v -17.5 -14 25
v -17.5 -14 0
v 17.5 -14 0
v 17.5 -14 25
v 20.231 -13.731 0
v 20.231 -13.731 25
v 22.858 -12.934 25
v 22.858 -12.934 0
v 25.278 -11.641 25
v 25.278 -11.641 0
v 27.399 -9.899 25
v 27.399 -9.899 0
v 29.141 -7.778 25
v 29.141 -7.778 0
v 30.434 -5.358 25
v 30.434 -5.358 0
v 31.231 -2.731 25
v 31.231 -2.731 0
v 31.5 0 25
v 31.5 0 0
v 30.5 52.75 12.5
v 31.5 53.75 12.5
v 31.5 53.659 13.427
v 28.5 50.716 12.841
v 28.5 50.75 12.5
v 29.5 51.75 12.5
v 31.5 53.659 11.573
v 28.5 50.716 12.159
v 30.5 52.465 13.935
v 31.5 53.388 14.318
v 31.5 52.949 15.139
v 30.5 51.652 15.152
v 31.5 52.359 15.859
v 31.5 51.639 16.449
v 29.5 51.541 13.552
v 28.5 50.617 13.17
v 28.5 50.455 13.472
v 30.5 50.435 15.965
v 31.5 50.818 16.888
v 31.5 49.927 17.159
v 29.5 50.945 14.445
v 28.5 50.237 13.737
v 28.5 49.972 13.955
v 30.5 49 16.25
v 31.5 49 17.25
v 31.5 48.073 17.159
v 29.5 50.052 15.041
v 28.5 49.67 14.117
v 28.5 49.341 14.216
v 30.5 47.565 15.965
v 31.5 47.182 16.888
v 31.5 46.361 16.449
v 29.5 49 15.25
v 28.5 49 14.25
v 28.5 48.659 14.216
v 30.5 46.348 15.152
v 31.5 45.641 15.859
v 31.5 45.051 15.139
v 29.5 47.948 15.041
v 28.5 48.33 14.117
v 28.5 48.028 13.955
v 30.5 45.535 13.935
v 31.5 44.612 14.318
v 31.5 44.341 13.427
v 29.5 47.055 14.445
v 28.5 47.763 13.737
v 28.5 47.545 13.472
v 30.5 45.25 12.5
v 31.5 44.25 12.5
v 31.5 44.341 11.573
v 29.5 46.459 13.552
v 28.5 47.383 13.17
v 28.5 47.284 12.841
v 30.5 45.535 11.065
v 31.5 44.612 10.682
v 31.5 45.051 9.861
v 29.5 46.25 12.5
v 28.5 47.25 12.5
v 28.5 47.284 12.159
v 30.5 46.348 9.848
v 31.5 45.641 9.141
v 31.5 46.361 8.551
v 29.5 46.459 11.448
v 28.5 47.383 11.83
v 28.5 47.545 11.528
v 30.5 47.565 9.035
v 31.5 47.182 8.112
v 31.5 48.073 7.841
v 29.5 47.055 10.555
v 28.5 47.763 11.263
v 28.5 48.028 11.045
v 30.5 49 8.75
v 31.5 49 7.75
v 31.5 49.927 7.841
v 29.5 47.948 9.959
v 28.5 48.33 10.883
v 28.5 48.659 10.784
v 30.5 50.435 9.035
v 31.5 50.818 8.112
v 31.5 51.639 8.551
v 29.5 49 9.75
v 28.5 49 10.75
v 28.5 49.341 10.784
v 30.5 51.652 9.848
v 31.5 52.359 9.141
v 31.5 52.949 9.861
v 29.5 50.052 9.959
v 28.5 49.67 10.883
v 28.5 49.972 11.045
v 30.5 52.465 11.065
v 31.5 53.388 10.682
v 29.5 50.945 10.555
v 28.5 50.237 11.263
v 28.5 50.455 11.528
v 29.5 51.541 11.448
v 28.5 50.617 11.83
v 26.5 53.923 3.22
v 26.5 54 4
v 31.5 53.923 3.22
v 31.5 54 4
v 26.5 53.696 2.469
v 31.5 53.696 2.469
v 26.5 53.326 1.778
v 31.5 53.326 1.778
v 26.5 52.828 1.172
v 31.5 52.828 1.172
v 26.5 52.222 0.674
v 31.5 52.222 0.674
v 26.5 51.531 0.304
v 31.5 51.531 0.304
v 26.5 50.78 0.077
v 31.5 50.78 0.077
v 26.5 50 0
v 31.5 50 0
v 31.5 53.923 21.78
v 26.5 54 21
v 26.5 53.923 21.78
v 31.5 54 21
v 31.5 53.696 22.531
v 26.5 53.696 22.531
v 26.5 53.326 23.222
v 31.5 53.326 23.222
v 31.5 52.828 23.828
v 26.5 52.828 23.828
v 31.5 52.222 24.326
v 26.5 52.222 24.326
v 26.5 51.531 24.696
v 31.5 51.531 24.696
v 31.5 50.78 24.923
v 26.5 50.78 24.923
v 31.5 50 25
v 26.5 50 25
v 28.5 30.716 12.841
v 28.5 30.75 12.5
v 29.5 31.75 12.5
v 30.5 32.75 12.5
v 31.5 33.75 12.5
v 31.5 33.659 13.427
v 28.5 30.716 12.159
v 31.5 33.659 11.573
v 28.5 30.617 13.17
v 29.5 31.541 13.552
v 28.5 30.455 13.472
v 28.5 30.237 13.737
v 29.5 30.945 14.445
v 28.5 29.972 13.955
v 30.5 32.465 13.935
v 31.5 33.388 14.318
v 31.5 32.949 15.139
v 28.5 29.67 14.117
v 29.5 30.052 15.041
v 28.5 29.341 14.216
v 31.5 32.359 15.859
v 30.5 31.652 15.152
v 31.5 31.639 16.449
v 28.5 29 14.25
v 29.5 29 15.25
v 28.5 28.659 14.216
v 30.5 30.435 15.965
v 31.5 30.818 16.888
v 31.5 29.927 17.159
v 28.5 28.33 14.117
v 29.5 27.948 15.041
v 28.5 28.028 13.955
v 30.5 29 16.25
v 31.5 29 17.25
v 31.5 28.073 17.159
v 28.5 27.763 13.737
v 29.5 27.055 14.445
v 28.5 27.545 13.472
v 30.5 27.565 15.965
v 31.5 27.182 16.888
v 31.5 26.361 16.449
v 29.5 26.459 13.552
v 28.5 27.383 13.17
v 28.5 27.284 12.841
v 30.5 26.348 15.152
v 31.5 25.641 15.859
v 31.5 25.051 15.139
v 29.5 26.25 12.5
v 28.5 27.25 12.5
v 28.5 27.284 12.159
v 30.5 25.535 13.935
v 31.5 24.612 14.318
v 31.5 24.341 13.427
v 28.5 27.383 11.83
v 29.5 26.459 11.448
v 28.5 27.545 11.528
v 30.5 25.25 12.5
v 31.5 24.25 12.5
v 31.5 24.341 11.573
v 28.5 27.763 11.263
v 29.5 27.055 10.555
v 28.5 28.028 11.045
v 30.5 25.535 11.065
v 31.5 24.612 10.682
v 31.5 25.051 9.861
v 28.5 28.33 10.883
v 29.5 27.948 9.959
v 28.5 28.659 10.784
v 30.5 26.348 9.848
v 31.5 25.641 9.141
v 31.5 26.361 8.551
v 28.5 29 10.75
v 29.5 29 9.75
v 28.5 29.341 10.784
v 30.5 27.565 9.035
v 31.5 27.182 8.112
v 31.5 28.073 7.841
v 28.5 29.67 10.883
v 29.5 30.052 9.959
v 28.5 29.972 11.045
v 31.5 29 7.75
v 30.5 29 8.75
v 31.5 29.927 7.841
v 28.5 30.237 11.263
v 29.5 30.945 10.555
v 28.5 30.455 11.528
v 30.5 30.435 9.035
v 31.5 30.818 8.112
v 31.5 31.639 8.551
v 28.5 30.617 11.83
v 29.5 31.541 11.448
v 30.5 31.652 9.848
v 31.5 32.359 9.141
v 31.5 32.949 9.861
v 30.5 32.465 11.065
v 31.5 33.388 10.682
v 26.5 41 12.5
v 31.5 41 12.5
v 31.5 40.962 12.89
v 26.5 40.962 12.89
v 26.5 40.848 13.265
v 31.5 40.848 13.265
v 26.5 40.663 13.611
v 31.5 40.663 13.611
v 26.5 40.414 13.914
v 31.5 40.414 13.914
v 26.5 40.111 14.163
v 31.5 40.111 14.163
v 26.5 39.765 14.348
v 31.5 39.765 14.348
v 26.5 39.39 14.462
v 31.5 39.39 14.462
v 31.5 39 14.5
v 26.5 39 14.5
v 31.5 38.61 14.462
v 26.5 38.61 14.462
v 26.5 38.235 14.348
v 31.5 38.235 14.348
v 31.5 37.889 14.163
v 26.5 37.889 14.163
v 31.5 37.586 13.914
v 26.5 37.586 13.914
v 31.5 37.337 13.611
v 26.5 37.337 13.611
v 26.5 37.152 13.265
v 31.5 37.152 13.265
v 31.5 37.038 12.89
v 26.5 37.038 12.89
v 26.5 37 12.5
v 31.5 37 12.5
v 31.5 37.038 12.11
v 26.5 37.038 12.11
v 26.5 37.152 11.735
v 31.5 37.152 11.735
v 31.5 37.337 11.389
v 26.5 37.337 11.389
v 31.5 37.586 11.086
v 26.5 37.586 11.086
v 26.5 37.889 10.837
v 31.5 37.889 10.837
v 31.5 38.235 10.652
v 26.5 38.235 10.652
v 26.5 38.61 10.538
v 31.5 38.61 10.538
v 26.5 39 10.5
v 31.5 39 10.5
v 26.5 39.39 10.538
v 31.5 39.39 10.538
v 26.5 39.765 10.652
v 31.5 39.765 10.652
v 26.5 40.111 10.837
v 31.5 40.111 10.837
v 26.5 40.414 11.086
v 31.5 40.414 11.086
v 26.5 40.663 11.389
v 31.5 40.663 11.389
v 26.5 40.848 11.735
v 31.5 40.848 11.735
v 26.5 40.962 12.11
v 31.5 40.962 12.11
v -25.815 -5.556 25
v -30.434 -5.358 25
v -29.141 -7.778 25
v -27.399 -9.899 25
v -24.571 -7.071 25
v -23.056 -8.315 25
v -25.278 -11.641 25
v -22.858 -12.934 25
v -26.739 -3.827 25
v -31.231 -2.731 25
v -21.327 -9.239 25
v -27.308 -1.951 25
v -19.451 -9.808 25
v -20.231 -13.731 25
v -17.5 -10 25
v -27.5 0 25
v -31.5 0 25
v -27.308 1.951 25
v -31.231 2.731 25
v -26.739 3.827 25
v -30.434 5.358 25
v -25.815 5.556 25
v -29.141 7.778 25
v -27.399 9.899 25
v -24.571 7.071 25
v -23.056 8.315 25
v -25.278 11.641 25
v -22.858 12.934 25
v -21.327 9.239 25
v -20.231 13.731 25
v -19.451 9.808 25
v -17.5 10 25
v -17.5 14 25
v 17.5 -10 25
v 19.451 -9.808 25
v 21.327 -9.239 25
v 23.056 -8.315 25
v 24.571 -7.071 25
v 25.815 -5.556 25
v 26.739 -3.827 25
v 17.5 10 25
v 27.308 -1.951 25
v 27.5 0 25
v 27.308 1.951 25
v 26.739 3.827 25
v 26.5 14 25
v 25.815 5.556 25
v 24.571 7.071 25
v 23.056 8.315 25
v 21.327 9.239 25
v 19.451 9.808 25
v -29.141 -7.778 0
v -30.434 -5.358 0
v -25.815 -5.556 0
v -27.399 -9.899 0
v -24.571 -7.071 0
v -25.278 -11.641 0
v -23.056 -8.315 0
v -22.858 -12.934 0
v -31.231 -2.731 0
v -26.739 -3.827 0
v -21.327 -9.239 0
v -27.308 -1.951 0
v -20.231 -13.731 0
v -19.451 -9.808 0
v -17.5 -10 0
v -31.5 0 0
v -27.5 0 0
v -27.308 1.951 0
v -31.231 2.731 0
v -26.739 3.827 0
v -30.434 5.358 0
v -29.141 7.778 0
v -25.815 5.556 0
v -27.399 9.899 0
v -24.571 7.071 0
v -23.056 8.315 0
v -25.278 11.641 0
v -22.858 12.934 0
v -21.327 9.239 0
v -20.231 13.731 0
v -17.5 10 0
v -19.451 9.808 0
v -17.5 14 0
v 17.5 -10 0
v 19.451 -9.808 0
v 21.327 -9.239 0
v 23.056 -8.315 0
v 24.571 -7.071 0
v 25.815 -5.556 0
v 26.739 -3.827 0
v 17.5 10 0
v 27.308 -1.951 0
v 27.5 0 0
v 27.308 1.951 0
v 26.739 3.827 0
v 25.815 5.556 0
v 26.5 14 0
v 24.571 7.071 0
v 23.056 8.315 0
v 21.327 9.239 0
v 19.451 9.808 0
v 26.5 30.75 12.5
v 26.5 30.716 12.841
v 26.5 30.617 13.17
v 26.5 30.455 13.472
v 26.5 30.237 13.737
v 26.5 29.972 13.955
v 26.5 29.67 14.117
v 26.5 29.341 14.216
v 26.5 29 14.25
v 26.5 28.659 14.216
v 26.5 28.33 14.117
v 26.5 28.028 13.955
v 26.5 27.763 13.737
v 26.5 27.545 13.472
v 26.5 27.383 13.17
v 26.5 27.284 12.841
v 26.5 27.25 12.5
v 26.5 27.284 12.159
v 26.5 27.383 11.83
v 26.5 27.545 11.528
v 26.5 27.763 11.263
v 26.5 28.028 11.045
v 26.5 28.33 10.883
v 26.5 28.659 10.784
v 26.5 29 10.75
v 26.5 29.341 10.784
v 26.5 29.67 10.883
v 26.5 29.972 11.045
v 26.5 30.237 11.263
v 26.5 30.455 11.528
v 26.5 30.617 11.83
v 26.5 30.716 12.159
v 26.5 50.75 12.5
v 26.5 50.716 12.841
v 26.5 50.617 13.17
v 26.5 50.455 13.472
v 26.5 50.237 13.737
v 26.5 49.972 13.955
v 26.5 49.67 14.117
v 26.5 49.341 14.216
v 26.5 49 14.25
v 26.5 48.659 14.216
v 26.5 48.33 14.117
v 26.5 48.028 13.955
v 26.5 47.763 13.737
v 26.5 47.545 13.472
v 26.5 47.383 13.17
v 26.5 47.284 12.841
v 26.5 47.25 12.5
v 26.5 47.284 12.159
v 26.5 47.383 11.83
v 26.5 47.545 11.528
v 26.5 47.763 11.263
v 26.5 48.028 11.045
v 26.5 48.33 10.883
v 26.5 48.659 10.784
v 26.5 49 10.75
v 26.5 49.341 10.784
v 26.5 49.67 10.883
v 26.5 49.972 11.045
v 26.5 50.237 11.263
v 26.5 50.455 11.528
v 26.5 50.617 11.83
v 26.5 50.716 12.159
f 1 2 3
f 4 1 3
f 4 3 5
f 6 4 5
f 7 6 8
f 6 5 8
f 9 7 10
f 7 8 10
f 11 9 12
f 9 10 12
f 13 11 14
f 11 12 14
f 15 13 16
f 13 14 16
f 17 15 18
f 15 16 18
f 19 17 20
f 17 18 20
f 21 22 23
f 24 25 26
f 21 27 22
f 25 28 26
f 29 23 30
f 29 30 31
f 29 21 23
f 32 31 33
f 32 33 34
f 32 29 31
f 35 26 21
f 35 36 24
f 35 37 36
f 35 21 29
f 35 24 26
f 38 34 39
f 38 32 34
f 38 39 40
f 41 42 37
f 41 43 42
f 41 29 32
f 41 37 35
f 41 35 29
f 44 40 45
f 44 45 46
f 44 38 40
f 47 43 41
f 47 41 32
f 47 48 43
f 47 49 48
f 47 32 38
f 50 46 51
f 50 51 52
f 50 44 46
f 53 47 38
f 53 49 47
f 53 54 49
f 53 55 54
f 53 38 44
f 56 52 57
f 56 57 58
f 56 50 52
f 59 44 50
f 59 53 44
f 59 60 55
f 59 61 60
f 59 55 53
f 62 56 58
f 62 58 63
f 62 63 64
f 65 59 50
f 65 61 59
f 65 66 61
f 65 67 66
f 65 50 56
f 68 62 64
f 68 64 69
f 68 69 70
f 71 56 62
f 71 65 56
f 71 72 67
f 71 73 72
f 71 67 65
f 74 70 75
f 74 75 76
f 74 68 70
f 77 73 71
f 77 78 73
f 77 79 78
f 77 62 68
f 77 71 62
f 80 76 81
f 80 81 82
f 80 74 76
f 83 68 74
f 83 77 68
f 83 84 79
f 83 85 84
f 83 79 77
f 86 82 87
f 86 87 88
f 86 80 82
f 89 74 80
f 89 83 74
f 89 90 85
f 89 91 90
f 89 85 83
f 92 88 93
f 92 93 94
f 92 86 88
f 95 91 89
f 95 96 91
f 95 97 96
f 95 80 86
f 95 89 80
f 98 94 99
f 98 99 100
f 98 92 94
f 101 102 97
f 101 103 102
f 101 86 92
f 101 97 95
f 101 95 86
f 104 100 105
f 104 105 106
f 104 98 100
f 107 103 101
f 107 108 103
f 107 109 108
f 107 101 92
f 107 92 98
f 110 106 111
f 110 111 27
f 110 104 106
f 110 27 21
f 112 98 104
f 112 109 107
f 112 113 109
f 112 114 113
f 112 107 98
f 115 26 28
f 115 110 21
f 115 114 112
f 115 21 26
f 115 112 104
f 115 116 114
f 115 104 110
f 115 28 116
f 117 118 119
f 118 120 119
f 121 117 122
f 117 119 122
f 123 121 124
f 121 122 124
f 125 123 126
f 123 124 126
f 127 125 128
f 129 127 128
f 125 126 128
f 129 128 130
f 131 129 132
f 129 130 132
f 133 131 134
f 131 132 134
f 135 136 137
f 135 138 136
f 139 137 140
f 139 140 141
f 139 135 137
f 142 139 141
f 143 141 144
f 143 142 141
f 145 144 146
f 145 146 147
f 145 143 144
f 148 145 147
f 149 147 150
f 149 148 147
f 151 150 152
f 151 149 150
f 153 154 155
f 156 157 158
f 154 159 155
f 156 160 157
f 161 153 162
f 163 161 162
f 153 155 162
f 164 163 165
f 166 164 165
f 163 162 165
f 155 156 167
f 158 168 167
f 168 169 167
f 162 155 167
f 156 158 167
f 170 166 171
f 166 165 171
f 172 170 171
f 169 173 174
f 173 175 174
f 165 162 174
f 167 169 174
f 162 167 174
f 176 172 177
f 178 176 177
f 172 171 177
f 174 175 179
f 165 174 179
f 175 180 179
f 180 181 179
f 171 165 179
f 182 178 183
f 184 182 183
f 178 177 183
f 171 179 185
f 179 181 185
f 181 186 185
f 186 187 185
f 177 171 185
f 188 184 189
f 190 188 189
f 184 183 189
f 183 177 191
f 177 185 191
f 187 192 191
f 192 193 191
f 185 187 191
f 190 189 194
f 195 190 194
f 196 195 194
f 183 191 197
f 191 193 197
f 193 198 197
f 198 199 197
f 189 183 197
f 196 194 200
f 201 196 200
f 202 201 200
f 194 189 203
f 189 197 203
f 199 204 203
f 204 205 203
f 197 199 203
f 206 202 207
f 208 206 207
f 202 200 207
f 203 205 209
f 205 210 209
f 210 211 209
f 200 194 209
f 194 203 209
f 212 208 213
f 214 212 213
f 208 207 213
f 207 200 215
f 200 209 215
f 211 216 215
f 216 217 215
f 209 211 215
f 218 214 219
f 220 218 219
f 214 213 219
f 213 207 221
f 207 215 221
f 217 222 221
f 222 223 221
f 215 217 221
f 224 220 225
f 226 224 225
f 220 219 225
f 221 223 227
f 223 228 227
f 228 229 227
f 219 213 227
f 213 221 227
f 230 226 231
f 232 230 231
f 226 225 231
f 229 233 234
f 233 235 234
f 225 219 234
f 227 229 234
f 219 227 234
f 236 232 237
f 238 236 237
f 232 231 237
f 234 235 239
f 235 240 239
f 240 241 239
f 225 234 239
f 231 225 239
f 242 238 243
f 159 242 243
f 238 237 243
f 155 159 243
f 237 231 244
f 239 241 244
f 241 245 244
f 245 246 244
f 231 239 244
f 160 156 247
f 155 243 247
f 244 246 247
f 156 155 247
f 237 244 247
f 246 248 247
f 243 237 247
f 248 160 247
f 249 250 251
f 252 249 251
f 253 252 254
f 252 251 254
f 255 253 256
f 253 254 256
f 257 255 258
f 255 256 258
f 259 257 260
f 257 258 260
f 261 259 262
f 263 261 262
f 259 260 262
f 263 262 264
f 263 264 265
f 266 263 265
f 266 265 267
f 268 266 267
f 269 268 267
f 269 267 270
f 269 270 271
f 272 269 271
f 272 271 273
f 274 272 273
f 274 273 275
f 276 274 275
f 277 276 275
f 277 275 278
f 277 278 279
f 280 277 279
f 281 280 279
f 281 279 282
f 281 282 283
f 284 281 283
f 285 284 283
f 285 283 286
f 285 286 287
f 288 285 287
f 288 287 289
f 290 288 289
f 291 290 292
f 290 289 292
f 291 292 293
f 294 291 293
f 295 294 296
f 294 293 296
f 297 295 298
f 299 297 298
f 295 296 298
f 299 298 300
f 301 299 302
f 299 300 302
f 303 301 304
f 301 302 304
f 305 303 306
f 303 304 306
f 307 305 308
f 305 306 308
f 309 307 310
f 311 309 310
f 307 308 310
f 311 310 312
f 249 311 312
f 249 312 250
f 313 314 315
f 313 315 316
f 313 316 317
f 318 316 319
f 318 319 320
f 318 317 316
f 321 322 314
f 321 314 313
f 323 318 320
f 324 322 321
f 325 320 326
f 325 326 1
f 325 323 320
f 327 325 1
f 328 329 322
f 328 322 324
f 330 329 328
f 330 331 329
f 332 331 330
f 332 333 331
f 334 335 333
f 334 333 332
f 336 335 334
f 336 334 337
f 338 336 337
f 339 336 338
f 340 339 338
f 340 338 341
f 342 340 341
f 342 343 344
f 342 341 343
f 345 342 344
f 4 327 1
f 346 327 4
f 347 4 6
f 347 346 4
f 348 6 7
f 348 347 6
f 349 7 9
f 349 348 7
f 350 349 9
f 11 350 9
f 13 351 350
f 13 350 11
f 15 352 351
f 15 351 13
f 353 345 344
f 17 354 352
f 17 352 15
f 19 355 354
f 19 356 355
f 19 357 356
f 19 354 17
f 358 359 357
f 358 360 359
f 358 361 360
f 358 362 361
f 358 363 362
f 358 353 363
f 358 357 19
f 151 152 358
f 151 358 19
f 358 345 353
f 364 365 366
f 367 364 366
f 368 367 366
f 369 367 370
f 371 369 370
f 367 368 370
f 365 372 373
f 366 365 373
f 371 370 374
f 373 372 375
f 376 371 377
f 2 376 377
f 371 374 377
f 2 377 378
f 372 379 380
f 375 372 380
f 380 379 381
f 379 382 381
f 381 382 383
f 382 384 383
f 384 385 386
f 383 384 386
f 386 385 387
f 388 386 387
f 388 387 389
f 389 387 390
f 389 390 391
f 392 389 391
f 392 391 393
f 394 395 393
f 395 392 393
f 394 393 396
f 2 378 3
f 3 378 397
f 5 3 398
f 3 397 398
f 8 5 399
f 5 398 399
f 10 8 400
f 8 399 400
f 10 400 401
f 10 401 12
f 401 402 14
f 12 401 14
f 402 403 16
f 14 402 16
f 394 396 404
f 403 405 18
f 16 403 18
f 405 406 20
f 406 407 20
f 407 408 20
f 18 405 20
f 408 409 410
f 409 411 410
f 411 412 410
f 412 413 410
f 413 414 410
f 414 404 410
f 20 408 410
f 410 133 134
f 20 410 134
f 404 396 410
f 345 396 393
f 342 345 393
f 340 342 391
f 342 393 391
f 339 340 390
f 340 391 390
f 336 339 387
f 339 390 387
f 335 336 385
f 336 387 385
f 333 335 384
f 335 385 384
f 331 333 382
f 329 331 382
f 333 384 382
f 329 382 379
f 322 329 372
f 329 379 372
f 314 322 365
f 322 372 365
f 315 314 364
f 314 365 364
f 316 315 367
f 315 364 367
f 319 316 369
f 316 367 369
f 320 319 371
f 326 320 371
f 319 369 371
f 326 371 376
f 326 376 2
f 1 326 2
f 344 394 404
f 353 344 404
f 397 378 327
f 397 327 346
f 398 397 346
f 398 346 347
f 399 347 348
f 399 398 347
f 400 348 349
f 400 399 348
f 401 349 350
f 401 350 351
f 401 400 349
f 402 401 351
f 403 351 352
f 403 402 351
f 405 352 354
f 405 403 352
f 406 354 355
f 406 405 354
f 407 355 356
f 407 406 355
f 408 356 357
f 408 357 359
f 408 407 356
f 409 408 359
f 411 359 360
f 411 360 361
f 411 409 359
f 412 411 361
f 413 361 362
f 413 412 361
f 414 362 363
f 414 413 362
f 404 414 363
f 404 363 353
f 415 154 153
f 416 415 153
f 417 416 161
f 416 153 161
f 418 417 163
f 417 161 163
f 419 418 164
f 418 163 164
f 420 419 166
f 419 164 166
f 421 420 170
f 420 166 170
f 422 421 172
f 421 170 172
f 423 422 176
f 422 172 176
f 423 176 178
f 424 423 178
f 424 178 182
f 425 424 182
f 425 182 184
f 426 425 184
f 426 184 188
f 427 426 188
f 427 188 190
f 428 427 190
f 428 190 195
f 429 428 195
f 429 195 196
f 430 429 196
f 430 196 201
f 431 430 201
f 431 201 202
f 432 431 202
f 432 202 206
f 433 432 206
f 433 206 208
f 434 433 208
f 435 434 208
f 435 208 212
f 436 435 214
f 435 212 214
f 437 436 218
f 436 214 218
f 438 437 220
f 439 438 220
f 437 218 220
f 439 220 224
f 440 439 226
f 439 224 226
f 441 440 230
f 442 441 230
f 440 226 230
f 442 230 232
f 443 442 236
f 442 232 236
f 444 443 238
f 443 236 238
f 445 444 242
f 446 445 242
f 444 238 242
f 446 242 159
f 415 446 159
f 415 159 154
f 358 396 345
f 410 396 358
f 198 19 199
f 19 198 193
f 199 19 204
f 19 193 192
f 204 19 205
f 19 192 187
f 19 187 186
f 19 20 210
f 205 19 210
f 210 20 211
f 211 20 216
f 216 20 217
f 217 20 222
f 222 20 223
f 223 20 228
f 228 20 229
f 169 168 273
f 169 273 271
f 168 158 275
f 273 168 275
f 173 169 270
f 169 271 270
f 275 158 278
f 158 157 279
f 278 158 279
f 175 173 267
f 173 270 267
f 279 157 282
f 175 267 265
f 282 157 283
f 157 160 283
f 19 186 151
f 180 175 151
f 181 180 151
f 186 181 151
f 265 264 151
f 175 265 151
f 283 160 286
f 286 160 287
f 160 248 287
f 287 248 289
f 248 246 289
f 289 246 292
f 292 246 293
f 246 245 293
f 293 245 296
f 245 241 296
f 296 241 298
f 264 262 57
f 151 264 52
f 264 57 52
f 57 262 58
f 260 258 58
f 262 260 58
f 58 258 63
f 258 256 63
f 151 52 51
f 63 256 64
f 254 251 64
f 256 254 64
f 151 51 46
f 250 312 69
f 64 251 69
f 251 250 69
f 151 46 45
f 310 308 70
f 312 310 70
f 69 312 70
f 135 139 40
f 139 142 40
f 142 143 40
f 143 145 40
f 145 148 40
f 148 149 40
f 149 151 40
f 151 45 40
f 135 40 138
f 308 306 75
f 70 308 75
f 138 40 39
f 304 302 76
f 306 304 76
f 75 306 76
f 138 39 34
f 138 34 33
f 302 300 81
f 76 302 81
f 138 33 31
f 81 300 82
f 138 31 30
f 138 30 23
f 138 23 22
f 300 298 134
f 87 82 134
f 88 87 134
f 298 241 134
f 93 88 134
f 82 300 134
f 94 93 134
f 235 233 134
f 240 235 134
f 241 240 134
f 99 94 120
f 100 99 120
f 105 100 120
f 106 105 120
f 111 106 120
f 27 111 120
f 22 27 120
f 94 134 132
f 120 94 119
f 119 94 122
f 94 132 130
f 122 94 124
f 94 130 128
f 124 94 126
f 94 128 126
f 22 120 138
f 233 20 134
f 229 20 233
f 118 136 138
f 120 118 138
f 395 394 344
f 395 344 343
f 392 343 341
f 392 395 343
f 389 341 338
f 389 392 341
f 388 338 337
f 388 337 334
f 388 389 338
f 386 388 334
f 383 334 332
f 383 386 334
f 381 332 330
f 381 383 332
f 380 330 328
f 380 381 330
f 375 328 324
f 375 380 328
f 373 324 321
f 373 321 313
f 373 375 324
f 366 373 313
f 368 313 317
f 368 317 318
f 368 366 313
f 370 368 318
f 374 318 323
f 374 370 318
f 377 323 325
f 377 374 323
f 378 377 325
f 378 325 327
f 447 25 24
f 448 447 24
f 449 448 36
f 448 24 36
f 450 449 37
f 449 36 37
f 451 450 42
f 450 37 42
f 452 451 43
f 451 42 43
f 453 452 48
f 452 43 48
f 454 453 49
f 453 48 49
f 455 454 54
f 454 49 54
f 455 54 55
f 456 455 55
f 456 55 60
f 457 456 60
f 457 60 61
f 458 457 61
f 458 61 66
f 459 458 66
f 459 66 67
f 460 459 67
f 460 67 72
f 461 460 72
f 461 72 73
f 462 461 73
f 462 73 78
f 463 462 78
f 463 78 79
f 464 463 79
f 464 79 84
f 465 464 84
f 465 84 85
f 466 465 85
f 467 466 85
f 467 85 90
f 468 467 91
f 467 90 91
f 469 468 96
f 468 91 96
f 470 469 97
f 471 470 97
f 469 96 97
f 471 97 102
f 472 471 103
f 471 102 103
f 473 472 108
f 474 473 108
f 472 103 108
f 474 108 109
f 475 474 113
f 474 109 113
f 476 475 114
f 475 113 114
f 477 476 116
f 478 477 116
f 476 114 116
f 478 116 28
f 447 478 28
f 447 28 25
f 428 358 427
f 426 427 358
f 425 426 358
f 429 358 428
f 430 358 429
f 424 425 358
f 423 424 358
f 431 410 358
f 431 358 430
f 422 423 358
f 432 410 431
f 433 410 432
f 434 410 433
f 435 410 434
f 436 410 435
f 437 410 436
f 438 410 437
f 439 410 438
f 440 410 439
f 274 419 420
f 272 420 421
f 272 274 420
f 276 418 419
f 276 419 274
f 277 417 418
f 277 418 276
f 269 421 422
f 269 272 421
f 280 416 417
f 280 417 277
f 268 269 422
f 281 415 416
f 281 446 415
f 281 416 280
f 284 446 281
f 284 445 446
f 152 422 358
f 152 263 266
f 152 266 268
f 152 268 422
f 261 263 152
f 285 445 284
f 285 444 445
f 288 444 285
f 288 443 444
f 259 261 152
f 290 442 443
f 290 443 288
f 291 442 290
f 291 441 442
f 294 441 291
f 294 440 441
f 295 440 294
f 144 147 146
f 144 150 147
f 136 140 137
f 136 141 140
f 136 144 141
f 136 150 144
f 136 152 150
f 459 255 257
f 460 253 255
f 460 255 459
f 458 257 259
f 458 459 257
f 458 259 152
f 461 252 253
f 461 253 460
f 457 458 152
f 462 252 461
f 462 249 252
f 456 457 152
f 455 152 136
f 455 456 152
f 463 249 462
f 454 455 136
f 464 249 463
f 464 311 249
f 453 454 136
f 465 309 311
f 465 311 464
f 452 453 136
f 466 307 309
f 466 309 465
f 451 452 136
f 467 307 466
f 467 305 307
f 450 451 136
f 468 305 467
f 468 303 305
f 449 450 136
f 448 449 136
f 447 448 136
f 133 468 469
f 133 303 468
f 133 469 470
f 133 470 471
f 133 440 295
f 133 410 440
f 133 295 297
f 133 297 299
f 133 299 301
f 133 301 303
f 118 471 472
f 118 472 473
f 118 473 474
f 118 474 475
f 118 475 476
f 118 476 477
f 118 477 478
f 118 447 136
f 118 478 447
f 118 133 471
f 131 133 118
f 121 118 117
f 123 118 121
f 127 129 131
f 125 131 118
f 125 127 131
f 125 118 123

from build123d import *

# Parameters (mm, degrees)
PAD_DEPTH       = 25
FILLET_R        = 4
SKETCH001_R     = 2
SKETCH001_R_2   = 1.75
POCKET_DEPTH    = 63.001
CHAMFER_SIZE    = 3
CHAMFER001_SIZE = 3


with BuildPart() as part:
    # Sketch → Pad (new body)
    with BuildSketch(Plane.XY):
        with BuildLine():
            ThreePointArc((-17.5, 14), (-31.5, 0), (-17.5, -14))
            Line((-17.5, -14), (17.5, -14))
            ThreePointArc((17.5, -14), (27.399495, -9.899495), (31.5, 0))
            Line((31.5, 0), (31.5, 54))
            Line((26.5, 54), (31.5, 54))
            Line((26.5, 14), (26.5, 54))
            Line((-17.5, 14), (26.5, 14))
        make_face()
        with BuildLine():
            ThreePointArc((-17.5, 10), (-27.5, 0), (-17.5, -10))
            Line((-17.5, -10), (17.5, -10))
            ThreePointArc((17.5, -10), (27.5, 0), (17.5, 10))
            Line((-17.5, 10), (17.5, 10))
        make_face(mode=Mode.SUBTRACT)
    extrude(amount=PAD_DEPTH)

    # Fillet
    fillet_edges = [part.edges().sort_by_distance(p)[0] for p in [
        (29, 54, 0),
        (29, 54, 25),
    ]]
    fillet(fillet_edges, radius=FILLET_R)

    # Sketch001 (on Face8 of Fillet) → Pocket (cut, through all)
    with BuildSketch(Plane.YZ.offset(31.5)):
        with Locations((39, 12.5)):
            Circle(SKETCH001_R)
        with Locations((49, 12.5)):
            Circle(SKETCH001_R_2)
        with Locations((29, 12.5)):
            Circle(SKETCH001_R_2)
    extrude(amount=-POCKET_DEPTH, mode=Mode.SUBTRACT)

    # Chamfer
    chamfer_edges = [part.edges().sort_by_distance(p)[0] for p in [
        (31.5, 27.25, 12.5),
    ]]
    chamfer(chamfer_edges, length=CHAMFER_SIZE)

    # Chamfer001
    chamfer001_edges = [part.edges().sort_by_distance(p)[0] for p in [
        (31.5, 47.25, 12.5),
    ]]
    chamfer(chamfer001_edges, length=CHAMFER001_SIZE)


solid = part.part
